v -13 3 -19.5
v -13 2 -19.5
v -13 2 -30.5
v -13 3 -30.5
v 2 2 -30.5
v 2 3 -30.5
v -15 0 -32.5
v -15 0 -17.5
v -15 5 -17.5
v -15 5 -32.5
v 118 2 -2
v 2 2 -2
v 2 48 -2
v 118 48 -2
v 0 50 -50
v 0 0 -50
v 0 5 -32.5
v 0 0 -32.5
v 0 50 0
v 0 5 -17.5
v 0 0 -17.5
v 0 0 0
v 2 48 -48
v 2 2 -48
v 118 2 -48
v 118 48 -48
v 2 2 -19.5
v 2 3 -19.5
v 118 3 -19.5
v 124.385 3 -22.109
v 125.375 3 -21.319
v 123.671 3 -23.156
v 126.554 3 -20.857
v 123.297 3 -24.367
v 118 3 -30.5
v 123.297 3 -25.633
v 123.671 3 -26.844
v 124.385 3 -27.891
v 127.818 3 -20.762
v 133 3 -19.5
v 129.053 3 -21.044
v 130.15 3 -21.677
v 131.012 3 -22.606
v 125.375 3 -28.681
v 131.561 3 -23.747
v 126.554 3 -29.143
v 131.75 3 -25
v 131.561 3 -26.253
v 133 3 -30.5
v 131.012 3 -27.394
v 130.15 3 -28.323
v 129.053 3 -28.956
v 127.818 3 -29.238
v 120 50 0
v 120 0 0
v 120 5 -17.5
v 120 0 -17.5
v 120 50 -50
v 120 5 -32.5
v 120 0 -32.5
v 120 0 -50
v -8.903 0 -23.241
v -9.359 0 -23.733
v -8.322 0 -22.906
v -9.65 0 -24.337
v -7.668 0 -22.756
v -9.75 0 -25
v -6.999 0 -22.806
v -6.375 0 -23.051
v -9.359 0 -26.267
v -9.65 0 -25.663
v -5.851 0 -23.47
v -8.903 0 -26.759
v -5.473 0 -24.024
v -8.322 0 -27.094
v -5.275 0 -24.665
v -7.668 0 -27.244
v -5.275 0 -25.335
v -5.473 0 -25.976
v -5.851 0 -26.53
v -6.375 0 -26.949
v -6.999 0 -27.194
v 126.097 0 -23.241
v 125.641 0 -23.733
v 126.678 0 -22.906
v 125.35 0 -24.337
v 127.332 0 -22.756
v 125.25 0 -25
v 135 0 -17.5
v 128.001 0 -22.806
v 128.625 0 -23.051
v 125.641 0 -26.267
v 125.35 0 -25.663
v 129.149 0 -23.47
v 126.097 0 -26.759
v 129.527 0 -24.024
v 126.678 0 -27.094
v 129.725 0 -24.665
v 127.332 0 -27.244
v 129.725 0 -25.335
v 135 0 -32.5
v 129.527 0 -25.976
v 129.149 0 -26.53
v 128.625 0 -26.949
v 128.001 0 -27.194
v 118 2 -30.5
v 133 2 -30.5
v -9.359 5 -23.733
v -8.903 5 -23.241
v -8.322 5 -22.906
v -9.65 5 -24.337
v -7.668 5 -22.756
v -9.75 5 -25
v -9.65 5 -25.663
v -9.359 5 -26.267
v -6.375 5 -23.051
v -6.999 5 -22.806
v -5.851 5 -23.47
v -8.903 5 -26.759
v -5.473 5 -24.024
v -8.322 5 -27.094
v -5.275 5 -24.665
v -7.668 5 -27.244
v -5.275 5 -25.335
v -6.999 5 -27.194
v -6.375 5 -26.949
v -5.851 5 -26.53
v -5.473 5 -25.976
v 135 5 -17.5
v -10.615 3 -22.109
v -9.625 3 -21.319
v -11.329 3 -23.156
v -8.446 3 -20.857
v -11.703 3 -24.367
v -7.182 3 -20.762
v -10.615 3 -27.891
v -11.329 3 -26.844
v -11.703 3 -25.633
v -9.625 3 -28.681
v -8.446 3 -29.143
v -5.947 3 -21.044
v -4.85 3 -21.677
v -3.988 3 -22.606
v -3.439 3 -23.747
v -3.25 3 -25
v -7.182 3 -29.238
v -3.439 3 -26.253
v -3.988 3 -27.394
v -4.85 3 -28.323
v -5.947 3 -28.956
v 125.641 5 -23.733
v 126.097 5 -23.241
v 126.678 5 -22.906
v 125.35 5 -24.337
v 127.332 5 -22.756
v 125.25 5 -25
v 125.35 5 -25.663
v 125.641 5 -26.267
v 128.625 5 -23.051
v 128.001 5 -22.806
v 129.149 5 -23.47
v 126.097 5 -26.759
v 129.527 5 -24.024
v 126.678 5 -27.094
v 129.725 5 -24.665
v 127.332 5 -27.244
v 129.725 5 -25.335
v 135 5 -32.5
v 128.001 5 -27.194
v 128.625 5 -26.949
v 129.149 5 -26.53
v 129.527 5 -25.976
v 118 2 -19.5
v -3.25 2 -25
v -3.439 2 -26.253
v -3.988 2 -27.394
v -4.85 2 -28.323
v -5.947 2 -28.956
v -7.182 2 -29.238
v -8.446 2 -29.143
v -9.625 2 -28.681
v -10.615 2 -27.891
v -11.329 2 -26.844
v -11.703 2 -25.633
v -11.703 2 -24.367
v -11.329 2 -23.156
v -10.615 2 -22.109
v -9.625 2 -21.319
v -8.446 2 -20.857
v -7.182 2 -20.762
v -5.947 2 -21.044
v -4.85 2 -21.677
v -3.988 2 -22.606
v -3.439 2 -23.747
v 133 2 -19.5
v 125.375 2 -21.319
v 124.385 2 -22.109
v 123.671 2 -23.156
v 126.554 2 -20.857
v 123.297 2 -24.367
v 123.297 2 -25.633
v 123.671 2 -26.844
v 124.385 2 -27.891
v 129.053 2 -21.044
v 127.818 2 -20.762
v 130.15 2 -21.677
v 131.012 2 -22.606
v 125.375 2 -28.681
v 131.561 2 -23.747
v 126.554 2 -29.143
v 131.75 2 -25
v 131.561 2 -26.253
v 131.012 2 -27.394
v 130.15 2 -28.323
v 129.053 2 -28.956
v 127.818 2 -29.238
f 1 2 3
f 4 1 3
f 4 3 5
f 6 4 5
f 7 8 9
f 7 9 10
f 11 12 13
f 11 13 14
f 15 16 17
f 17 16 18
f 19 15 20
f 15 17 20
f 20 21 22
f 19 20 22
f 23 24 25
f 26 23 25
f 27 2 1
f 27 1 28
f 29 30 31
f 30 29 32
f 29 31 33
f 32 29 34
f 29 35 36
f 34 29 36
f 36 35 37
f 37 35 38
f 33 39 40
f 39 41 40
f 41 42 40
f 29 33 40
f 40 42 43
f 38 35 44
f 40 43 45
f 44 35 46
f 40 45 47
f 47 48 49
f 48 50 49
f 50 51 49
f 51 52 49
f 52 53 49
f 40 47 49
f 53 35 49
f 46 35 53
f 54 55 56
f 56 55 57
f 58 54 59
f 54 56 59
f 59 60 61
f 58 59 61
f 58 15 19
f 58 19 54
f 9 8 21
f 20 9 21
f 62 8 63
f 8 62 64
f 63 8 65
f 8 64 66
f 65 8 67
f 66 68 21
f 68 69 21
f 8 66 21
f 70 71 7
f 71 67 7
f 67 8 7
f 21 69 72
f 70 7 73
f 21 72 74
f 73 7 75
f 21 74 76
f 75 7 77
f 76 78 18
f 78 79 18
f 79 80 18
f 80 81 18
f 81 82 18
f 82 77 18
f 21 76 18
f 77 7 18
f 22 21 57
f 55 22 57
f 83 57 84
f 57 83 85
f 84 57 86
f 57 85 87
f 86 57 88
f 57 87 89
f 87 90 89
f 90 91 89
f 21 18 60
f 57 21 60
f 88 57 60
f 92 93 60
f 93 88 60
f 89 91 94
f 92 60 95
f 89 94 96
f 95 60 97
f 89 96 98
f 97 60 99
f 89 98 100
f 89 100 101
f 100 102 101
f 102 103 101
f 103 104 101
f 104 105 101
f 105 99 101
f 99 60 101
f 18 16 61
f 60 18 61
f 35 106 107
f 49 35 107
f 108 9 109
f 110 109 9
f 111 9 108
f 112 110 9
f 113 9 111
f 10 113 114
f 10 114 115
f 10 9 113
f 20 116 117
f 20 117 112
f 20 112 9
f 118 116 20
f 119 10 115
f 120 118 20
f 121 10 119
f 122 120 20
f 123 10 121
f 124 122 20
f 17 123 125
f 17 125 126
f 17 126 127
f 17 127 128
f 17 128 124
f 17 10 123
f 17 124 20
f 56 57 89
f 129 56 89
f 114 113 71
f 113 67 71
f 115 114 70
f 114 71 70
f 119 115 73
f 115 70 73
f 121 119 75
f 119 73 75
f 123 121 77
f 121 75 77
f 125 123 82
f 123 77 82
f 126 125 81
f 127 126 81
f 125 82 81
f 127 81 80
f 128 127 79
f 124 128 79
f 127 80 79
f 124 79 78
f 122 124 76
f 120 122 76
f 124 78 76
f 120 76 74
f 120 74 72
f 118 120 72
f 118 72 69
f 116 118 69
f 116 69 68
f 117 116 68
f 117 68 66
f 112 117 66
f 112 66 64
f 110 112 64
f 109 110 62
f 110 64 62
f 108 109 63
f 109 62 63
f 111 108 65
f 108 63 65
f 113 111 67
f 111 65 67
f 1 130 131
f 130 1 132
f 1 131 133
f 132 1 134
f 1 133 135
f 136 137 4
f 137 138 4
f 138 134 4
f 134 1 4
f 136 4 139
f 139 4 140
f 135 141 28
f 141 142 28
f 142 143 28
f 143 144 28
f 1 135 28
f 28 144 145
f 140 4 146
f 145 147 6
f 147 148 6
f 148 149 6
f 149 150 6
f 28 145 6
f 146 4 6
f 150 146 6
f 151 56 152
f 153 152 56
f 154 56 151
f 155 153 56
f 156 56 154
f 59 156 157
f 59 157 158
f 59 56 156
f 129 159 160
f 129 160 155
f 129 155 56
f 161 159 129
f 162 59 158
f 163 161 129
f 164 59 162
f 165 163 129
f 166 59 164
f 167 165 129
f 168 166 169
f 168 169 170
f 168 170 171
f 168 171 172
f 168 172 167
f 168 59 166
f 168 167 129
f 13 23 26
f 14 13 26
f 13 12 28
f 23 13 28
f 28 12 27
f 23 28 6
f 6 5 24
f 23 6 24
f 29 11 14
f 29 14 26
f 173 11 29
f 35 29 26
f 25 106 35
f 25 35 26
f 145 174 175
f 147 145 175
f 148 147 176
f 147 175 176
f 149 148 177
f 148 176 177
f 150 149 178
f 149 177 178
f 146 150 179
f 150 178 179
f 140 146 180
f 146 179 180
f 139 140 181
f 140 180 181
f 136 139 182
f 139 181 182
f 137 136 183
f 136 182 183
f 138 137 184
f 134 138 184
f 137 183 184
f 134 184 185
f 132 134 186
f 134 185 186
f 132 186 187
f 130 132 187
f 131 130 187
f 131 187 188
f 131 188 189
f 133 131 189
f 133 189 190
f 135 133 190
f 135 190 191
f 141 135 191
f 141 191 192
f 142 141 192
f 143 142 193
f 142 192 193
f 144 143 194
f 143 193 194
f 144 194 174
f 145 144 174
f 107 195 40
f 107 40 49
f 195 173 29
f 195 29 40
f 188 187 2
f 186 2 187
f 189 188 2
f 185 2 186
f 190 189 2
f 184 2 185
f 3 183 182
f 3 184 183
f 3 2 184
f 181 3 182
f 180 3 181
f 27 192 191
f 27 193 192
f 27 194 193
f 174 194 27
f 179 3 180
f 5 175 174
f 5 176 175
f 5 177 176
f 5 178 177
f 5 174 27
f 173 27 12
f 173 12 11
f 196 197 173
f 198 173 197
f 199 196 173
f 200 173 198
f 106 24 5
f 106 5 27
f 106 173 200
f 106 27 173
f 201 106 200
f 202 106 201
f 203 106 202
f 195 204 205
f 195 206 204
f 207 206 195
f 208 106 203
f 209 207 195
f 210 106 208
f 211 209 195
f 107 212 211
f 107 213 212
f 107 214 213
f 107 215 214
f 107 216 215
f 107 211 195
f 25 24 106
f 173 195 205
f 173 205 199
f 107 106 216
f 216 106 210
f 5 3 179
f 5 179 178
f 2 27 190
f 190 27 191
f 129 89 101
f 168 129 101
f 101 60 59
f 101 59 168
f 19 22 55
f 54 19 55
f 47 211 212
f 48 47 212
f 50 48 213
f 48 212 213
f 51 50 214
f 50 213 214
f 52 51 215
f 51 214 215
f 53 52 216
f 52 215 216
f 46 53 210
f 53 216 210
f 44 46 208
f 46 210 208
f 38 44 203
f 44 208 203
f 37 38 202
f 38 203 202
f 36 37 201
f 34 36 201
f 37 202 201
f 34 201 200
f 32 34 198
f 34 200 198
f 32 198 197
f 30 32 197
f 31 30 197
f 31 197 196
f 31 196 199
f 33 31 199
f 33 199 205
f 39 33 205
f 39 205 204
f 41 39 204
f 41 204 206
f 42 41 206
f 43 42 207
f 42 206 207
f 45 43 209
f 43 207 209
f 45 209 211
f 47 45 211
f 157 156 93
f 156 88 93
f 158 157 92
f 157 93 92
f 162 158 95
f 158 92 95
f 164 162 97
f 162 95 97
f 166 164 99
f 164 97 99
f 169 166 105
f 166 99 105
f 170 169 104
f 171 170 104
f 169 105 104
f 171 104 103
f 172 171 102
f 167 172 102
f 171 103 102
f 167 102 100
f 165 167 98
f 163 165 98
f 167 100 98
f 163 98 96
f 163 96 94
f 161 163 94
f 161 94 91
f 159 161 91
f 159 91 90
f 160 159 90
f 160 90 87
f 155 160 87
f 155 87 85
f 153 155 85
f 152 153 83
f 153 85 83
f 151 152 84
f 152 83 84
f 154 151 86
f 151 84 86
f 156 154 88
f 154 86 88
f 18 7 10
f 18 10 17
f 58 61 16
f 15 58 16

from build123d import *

# Parameters (mm, degrees)
BOSS_EXTRU_2_DEPTH   = 50
R_SERVOIR_TEST_3_W   = 15
R_SERVOIR_TEST_3_H   = 15
BOSS_EXTRU_3_DEPTH   = 5
D_GAGEMENT_M41_D     = 4.5
D_GAGEMENT_M41_DEPTH = 5
D_GAGEMENT_M41_TIP   = 1.351936393
COQUE3_START         = 2
COQUE3_OUTLINE_W     = 116
COQUE3_OUTLINE_H     = 46
COQUE3_DEPTH         = 46
COQUE3_2_OUTLINE_W   = 15
COQUE3_2_OUTLINE_H   = 11
COQUE3_2_OUTLINE_R   = 4.25
COQUE3_2_DEPTH       = 1


# Read off the part's stored shape, not the designer's step: Coque3
with BuildPart() as part:
    # Réservoir test → Boss.-Extru.2 (new body)
    with BuildSketch(Plane(origin=(0, 0, 0), x_dir=(1, 0, 0), z_dir=(0, 1, 0))):
        Polygon((60, 0), (60, 50), (0, 50), (0, 32.5), (0, 17.5), (0, 0), align=None)
        Polygon((120, 50), (60, 50), (60, 0), (120, 0), (120, 17.5), (120, 32.5), align=None)
    extrude(amount=BOSS_EXTRU_2_DEPTH)

    # Réservoir test<3> → Boss.-Extru.3 (add)
    with BuildSketch(Plane(origin=(0, 0, 0), x_dir=(1, 0, 0), z_dir=(0, 1, 0))):
        with Locations((-7.5, 25)):
            Rectangle(R_SERVOIR_TEST_3_W, R_SERVOIR_TEST_3_H)
        with Locations((127.5, 25)):
            Rectangle(R_SERVOIR_TEST_3_W, R_SERVOIR_TEST_3_H)
    extrude(amount=BOSS_EXTRU_3_DEPTH)

    # Dégagement M41
    with Locations(Plane(origin=(0, 5, 0), x_dir=(1, 0, 0), z_dir=(0, 1, 0))):
        with Locations((-7.5, 25), (127.5, 25)):
            Hole(D_GAGEMENT_M41_D / 2, depth=D_GAGEMENT_M41_DEPTH)
            with Locations((0, 0, -(D_GAGEMENT_M41_DEPTH + D_GAGEMENT_M41_TIP / 2))):  # 118° drill point
                Cone(0, D_GAGEMENT_M41_D / 2, D_GAGEMENT_M41_TIP, mode=Mode.SUBTRACT)

    # Coque3 outline → Coque3 (cut)
    with BuildSketch(Plane(origin=(0, 0, 0), x_dir=(1, 0, 0), z_dir=(0, 1, 0)).offset(COQUE3_START)):
        with Locations((60, 25)):
            Rectangle(COQUE3_OUTLINE_W, COQUE3_OUTLINE_H)
    extrude(amount=COQUE3_DEPTH, mode=Mode.SUBTRACT)

    # Coque3 2 outline → Coque3 2 (cut)
    # profile 1 of 2: a face of its own
    with BuildSketch(Plane(origin=(0, 0, 0), x_dir=(1, 0, 0), z_dir=(0, 1, 0)).offset(COQUE3_START)):
        with Locations((125.5, 25)):
            Rectangle(COQUE3_2_OUTLINE_W, COQUE3_2_OUTLINE_H)
        with Locations((127.5, 25)):
            Circle(COQUE3_2_OUTLINE_R, mode=Mode.SUBTRACT)
    # profile 2 of 2: a face of its own
    with BuildSketch(Plane(origin=(0, 0, 0), x_dir=(1, 0, 0), z_dir=(0, 1, 0)).offset(COQUE3_START)):
        with Locations((-5.5, 25)):
            Rectangle(COQUE3_2_OUTLINE_W, COQUE3_2_OUTLINE_H)
        with Locations((-7.5, 25)):
            Circle(COQUE3_2_OUTLINE_R, mode=Mode.SUBTRACT)
    extrude(amount=COQUE3_2_DEPTH, mode=Mode.SUBTRACT)


solid = part.part
